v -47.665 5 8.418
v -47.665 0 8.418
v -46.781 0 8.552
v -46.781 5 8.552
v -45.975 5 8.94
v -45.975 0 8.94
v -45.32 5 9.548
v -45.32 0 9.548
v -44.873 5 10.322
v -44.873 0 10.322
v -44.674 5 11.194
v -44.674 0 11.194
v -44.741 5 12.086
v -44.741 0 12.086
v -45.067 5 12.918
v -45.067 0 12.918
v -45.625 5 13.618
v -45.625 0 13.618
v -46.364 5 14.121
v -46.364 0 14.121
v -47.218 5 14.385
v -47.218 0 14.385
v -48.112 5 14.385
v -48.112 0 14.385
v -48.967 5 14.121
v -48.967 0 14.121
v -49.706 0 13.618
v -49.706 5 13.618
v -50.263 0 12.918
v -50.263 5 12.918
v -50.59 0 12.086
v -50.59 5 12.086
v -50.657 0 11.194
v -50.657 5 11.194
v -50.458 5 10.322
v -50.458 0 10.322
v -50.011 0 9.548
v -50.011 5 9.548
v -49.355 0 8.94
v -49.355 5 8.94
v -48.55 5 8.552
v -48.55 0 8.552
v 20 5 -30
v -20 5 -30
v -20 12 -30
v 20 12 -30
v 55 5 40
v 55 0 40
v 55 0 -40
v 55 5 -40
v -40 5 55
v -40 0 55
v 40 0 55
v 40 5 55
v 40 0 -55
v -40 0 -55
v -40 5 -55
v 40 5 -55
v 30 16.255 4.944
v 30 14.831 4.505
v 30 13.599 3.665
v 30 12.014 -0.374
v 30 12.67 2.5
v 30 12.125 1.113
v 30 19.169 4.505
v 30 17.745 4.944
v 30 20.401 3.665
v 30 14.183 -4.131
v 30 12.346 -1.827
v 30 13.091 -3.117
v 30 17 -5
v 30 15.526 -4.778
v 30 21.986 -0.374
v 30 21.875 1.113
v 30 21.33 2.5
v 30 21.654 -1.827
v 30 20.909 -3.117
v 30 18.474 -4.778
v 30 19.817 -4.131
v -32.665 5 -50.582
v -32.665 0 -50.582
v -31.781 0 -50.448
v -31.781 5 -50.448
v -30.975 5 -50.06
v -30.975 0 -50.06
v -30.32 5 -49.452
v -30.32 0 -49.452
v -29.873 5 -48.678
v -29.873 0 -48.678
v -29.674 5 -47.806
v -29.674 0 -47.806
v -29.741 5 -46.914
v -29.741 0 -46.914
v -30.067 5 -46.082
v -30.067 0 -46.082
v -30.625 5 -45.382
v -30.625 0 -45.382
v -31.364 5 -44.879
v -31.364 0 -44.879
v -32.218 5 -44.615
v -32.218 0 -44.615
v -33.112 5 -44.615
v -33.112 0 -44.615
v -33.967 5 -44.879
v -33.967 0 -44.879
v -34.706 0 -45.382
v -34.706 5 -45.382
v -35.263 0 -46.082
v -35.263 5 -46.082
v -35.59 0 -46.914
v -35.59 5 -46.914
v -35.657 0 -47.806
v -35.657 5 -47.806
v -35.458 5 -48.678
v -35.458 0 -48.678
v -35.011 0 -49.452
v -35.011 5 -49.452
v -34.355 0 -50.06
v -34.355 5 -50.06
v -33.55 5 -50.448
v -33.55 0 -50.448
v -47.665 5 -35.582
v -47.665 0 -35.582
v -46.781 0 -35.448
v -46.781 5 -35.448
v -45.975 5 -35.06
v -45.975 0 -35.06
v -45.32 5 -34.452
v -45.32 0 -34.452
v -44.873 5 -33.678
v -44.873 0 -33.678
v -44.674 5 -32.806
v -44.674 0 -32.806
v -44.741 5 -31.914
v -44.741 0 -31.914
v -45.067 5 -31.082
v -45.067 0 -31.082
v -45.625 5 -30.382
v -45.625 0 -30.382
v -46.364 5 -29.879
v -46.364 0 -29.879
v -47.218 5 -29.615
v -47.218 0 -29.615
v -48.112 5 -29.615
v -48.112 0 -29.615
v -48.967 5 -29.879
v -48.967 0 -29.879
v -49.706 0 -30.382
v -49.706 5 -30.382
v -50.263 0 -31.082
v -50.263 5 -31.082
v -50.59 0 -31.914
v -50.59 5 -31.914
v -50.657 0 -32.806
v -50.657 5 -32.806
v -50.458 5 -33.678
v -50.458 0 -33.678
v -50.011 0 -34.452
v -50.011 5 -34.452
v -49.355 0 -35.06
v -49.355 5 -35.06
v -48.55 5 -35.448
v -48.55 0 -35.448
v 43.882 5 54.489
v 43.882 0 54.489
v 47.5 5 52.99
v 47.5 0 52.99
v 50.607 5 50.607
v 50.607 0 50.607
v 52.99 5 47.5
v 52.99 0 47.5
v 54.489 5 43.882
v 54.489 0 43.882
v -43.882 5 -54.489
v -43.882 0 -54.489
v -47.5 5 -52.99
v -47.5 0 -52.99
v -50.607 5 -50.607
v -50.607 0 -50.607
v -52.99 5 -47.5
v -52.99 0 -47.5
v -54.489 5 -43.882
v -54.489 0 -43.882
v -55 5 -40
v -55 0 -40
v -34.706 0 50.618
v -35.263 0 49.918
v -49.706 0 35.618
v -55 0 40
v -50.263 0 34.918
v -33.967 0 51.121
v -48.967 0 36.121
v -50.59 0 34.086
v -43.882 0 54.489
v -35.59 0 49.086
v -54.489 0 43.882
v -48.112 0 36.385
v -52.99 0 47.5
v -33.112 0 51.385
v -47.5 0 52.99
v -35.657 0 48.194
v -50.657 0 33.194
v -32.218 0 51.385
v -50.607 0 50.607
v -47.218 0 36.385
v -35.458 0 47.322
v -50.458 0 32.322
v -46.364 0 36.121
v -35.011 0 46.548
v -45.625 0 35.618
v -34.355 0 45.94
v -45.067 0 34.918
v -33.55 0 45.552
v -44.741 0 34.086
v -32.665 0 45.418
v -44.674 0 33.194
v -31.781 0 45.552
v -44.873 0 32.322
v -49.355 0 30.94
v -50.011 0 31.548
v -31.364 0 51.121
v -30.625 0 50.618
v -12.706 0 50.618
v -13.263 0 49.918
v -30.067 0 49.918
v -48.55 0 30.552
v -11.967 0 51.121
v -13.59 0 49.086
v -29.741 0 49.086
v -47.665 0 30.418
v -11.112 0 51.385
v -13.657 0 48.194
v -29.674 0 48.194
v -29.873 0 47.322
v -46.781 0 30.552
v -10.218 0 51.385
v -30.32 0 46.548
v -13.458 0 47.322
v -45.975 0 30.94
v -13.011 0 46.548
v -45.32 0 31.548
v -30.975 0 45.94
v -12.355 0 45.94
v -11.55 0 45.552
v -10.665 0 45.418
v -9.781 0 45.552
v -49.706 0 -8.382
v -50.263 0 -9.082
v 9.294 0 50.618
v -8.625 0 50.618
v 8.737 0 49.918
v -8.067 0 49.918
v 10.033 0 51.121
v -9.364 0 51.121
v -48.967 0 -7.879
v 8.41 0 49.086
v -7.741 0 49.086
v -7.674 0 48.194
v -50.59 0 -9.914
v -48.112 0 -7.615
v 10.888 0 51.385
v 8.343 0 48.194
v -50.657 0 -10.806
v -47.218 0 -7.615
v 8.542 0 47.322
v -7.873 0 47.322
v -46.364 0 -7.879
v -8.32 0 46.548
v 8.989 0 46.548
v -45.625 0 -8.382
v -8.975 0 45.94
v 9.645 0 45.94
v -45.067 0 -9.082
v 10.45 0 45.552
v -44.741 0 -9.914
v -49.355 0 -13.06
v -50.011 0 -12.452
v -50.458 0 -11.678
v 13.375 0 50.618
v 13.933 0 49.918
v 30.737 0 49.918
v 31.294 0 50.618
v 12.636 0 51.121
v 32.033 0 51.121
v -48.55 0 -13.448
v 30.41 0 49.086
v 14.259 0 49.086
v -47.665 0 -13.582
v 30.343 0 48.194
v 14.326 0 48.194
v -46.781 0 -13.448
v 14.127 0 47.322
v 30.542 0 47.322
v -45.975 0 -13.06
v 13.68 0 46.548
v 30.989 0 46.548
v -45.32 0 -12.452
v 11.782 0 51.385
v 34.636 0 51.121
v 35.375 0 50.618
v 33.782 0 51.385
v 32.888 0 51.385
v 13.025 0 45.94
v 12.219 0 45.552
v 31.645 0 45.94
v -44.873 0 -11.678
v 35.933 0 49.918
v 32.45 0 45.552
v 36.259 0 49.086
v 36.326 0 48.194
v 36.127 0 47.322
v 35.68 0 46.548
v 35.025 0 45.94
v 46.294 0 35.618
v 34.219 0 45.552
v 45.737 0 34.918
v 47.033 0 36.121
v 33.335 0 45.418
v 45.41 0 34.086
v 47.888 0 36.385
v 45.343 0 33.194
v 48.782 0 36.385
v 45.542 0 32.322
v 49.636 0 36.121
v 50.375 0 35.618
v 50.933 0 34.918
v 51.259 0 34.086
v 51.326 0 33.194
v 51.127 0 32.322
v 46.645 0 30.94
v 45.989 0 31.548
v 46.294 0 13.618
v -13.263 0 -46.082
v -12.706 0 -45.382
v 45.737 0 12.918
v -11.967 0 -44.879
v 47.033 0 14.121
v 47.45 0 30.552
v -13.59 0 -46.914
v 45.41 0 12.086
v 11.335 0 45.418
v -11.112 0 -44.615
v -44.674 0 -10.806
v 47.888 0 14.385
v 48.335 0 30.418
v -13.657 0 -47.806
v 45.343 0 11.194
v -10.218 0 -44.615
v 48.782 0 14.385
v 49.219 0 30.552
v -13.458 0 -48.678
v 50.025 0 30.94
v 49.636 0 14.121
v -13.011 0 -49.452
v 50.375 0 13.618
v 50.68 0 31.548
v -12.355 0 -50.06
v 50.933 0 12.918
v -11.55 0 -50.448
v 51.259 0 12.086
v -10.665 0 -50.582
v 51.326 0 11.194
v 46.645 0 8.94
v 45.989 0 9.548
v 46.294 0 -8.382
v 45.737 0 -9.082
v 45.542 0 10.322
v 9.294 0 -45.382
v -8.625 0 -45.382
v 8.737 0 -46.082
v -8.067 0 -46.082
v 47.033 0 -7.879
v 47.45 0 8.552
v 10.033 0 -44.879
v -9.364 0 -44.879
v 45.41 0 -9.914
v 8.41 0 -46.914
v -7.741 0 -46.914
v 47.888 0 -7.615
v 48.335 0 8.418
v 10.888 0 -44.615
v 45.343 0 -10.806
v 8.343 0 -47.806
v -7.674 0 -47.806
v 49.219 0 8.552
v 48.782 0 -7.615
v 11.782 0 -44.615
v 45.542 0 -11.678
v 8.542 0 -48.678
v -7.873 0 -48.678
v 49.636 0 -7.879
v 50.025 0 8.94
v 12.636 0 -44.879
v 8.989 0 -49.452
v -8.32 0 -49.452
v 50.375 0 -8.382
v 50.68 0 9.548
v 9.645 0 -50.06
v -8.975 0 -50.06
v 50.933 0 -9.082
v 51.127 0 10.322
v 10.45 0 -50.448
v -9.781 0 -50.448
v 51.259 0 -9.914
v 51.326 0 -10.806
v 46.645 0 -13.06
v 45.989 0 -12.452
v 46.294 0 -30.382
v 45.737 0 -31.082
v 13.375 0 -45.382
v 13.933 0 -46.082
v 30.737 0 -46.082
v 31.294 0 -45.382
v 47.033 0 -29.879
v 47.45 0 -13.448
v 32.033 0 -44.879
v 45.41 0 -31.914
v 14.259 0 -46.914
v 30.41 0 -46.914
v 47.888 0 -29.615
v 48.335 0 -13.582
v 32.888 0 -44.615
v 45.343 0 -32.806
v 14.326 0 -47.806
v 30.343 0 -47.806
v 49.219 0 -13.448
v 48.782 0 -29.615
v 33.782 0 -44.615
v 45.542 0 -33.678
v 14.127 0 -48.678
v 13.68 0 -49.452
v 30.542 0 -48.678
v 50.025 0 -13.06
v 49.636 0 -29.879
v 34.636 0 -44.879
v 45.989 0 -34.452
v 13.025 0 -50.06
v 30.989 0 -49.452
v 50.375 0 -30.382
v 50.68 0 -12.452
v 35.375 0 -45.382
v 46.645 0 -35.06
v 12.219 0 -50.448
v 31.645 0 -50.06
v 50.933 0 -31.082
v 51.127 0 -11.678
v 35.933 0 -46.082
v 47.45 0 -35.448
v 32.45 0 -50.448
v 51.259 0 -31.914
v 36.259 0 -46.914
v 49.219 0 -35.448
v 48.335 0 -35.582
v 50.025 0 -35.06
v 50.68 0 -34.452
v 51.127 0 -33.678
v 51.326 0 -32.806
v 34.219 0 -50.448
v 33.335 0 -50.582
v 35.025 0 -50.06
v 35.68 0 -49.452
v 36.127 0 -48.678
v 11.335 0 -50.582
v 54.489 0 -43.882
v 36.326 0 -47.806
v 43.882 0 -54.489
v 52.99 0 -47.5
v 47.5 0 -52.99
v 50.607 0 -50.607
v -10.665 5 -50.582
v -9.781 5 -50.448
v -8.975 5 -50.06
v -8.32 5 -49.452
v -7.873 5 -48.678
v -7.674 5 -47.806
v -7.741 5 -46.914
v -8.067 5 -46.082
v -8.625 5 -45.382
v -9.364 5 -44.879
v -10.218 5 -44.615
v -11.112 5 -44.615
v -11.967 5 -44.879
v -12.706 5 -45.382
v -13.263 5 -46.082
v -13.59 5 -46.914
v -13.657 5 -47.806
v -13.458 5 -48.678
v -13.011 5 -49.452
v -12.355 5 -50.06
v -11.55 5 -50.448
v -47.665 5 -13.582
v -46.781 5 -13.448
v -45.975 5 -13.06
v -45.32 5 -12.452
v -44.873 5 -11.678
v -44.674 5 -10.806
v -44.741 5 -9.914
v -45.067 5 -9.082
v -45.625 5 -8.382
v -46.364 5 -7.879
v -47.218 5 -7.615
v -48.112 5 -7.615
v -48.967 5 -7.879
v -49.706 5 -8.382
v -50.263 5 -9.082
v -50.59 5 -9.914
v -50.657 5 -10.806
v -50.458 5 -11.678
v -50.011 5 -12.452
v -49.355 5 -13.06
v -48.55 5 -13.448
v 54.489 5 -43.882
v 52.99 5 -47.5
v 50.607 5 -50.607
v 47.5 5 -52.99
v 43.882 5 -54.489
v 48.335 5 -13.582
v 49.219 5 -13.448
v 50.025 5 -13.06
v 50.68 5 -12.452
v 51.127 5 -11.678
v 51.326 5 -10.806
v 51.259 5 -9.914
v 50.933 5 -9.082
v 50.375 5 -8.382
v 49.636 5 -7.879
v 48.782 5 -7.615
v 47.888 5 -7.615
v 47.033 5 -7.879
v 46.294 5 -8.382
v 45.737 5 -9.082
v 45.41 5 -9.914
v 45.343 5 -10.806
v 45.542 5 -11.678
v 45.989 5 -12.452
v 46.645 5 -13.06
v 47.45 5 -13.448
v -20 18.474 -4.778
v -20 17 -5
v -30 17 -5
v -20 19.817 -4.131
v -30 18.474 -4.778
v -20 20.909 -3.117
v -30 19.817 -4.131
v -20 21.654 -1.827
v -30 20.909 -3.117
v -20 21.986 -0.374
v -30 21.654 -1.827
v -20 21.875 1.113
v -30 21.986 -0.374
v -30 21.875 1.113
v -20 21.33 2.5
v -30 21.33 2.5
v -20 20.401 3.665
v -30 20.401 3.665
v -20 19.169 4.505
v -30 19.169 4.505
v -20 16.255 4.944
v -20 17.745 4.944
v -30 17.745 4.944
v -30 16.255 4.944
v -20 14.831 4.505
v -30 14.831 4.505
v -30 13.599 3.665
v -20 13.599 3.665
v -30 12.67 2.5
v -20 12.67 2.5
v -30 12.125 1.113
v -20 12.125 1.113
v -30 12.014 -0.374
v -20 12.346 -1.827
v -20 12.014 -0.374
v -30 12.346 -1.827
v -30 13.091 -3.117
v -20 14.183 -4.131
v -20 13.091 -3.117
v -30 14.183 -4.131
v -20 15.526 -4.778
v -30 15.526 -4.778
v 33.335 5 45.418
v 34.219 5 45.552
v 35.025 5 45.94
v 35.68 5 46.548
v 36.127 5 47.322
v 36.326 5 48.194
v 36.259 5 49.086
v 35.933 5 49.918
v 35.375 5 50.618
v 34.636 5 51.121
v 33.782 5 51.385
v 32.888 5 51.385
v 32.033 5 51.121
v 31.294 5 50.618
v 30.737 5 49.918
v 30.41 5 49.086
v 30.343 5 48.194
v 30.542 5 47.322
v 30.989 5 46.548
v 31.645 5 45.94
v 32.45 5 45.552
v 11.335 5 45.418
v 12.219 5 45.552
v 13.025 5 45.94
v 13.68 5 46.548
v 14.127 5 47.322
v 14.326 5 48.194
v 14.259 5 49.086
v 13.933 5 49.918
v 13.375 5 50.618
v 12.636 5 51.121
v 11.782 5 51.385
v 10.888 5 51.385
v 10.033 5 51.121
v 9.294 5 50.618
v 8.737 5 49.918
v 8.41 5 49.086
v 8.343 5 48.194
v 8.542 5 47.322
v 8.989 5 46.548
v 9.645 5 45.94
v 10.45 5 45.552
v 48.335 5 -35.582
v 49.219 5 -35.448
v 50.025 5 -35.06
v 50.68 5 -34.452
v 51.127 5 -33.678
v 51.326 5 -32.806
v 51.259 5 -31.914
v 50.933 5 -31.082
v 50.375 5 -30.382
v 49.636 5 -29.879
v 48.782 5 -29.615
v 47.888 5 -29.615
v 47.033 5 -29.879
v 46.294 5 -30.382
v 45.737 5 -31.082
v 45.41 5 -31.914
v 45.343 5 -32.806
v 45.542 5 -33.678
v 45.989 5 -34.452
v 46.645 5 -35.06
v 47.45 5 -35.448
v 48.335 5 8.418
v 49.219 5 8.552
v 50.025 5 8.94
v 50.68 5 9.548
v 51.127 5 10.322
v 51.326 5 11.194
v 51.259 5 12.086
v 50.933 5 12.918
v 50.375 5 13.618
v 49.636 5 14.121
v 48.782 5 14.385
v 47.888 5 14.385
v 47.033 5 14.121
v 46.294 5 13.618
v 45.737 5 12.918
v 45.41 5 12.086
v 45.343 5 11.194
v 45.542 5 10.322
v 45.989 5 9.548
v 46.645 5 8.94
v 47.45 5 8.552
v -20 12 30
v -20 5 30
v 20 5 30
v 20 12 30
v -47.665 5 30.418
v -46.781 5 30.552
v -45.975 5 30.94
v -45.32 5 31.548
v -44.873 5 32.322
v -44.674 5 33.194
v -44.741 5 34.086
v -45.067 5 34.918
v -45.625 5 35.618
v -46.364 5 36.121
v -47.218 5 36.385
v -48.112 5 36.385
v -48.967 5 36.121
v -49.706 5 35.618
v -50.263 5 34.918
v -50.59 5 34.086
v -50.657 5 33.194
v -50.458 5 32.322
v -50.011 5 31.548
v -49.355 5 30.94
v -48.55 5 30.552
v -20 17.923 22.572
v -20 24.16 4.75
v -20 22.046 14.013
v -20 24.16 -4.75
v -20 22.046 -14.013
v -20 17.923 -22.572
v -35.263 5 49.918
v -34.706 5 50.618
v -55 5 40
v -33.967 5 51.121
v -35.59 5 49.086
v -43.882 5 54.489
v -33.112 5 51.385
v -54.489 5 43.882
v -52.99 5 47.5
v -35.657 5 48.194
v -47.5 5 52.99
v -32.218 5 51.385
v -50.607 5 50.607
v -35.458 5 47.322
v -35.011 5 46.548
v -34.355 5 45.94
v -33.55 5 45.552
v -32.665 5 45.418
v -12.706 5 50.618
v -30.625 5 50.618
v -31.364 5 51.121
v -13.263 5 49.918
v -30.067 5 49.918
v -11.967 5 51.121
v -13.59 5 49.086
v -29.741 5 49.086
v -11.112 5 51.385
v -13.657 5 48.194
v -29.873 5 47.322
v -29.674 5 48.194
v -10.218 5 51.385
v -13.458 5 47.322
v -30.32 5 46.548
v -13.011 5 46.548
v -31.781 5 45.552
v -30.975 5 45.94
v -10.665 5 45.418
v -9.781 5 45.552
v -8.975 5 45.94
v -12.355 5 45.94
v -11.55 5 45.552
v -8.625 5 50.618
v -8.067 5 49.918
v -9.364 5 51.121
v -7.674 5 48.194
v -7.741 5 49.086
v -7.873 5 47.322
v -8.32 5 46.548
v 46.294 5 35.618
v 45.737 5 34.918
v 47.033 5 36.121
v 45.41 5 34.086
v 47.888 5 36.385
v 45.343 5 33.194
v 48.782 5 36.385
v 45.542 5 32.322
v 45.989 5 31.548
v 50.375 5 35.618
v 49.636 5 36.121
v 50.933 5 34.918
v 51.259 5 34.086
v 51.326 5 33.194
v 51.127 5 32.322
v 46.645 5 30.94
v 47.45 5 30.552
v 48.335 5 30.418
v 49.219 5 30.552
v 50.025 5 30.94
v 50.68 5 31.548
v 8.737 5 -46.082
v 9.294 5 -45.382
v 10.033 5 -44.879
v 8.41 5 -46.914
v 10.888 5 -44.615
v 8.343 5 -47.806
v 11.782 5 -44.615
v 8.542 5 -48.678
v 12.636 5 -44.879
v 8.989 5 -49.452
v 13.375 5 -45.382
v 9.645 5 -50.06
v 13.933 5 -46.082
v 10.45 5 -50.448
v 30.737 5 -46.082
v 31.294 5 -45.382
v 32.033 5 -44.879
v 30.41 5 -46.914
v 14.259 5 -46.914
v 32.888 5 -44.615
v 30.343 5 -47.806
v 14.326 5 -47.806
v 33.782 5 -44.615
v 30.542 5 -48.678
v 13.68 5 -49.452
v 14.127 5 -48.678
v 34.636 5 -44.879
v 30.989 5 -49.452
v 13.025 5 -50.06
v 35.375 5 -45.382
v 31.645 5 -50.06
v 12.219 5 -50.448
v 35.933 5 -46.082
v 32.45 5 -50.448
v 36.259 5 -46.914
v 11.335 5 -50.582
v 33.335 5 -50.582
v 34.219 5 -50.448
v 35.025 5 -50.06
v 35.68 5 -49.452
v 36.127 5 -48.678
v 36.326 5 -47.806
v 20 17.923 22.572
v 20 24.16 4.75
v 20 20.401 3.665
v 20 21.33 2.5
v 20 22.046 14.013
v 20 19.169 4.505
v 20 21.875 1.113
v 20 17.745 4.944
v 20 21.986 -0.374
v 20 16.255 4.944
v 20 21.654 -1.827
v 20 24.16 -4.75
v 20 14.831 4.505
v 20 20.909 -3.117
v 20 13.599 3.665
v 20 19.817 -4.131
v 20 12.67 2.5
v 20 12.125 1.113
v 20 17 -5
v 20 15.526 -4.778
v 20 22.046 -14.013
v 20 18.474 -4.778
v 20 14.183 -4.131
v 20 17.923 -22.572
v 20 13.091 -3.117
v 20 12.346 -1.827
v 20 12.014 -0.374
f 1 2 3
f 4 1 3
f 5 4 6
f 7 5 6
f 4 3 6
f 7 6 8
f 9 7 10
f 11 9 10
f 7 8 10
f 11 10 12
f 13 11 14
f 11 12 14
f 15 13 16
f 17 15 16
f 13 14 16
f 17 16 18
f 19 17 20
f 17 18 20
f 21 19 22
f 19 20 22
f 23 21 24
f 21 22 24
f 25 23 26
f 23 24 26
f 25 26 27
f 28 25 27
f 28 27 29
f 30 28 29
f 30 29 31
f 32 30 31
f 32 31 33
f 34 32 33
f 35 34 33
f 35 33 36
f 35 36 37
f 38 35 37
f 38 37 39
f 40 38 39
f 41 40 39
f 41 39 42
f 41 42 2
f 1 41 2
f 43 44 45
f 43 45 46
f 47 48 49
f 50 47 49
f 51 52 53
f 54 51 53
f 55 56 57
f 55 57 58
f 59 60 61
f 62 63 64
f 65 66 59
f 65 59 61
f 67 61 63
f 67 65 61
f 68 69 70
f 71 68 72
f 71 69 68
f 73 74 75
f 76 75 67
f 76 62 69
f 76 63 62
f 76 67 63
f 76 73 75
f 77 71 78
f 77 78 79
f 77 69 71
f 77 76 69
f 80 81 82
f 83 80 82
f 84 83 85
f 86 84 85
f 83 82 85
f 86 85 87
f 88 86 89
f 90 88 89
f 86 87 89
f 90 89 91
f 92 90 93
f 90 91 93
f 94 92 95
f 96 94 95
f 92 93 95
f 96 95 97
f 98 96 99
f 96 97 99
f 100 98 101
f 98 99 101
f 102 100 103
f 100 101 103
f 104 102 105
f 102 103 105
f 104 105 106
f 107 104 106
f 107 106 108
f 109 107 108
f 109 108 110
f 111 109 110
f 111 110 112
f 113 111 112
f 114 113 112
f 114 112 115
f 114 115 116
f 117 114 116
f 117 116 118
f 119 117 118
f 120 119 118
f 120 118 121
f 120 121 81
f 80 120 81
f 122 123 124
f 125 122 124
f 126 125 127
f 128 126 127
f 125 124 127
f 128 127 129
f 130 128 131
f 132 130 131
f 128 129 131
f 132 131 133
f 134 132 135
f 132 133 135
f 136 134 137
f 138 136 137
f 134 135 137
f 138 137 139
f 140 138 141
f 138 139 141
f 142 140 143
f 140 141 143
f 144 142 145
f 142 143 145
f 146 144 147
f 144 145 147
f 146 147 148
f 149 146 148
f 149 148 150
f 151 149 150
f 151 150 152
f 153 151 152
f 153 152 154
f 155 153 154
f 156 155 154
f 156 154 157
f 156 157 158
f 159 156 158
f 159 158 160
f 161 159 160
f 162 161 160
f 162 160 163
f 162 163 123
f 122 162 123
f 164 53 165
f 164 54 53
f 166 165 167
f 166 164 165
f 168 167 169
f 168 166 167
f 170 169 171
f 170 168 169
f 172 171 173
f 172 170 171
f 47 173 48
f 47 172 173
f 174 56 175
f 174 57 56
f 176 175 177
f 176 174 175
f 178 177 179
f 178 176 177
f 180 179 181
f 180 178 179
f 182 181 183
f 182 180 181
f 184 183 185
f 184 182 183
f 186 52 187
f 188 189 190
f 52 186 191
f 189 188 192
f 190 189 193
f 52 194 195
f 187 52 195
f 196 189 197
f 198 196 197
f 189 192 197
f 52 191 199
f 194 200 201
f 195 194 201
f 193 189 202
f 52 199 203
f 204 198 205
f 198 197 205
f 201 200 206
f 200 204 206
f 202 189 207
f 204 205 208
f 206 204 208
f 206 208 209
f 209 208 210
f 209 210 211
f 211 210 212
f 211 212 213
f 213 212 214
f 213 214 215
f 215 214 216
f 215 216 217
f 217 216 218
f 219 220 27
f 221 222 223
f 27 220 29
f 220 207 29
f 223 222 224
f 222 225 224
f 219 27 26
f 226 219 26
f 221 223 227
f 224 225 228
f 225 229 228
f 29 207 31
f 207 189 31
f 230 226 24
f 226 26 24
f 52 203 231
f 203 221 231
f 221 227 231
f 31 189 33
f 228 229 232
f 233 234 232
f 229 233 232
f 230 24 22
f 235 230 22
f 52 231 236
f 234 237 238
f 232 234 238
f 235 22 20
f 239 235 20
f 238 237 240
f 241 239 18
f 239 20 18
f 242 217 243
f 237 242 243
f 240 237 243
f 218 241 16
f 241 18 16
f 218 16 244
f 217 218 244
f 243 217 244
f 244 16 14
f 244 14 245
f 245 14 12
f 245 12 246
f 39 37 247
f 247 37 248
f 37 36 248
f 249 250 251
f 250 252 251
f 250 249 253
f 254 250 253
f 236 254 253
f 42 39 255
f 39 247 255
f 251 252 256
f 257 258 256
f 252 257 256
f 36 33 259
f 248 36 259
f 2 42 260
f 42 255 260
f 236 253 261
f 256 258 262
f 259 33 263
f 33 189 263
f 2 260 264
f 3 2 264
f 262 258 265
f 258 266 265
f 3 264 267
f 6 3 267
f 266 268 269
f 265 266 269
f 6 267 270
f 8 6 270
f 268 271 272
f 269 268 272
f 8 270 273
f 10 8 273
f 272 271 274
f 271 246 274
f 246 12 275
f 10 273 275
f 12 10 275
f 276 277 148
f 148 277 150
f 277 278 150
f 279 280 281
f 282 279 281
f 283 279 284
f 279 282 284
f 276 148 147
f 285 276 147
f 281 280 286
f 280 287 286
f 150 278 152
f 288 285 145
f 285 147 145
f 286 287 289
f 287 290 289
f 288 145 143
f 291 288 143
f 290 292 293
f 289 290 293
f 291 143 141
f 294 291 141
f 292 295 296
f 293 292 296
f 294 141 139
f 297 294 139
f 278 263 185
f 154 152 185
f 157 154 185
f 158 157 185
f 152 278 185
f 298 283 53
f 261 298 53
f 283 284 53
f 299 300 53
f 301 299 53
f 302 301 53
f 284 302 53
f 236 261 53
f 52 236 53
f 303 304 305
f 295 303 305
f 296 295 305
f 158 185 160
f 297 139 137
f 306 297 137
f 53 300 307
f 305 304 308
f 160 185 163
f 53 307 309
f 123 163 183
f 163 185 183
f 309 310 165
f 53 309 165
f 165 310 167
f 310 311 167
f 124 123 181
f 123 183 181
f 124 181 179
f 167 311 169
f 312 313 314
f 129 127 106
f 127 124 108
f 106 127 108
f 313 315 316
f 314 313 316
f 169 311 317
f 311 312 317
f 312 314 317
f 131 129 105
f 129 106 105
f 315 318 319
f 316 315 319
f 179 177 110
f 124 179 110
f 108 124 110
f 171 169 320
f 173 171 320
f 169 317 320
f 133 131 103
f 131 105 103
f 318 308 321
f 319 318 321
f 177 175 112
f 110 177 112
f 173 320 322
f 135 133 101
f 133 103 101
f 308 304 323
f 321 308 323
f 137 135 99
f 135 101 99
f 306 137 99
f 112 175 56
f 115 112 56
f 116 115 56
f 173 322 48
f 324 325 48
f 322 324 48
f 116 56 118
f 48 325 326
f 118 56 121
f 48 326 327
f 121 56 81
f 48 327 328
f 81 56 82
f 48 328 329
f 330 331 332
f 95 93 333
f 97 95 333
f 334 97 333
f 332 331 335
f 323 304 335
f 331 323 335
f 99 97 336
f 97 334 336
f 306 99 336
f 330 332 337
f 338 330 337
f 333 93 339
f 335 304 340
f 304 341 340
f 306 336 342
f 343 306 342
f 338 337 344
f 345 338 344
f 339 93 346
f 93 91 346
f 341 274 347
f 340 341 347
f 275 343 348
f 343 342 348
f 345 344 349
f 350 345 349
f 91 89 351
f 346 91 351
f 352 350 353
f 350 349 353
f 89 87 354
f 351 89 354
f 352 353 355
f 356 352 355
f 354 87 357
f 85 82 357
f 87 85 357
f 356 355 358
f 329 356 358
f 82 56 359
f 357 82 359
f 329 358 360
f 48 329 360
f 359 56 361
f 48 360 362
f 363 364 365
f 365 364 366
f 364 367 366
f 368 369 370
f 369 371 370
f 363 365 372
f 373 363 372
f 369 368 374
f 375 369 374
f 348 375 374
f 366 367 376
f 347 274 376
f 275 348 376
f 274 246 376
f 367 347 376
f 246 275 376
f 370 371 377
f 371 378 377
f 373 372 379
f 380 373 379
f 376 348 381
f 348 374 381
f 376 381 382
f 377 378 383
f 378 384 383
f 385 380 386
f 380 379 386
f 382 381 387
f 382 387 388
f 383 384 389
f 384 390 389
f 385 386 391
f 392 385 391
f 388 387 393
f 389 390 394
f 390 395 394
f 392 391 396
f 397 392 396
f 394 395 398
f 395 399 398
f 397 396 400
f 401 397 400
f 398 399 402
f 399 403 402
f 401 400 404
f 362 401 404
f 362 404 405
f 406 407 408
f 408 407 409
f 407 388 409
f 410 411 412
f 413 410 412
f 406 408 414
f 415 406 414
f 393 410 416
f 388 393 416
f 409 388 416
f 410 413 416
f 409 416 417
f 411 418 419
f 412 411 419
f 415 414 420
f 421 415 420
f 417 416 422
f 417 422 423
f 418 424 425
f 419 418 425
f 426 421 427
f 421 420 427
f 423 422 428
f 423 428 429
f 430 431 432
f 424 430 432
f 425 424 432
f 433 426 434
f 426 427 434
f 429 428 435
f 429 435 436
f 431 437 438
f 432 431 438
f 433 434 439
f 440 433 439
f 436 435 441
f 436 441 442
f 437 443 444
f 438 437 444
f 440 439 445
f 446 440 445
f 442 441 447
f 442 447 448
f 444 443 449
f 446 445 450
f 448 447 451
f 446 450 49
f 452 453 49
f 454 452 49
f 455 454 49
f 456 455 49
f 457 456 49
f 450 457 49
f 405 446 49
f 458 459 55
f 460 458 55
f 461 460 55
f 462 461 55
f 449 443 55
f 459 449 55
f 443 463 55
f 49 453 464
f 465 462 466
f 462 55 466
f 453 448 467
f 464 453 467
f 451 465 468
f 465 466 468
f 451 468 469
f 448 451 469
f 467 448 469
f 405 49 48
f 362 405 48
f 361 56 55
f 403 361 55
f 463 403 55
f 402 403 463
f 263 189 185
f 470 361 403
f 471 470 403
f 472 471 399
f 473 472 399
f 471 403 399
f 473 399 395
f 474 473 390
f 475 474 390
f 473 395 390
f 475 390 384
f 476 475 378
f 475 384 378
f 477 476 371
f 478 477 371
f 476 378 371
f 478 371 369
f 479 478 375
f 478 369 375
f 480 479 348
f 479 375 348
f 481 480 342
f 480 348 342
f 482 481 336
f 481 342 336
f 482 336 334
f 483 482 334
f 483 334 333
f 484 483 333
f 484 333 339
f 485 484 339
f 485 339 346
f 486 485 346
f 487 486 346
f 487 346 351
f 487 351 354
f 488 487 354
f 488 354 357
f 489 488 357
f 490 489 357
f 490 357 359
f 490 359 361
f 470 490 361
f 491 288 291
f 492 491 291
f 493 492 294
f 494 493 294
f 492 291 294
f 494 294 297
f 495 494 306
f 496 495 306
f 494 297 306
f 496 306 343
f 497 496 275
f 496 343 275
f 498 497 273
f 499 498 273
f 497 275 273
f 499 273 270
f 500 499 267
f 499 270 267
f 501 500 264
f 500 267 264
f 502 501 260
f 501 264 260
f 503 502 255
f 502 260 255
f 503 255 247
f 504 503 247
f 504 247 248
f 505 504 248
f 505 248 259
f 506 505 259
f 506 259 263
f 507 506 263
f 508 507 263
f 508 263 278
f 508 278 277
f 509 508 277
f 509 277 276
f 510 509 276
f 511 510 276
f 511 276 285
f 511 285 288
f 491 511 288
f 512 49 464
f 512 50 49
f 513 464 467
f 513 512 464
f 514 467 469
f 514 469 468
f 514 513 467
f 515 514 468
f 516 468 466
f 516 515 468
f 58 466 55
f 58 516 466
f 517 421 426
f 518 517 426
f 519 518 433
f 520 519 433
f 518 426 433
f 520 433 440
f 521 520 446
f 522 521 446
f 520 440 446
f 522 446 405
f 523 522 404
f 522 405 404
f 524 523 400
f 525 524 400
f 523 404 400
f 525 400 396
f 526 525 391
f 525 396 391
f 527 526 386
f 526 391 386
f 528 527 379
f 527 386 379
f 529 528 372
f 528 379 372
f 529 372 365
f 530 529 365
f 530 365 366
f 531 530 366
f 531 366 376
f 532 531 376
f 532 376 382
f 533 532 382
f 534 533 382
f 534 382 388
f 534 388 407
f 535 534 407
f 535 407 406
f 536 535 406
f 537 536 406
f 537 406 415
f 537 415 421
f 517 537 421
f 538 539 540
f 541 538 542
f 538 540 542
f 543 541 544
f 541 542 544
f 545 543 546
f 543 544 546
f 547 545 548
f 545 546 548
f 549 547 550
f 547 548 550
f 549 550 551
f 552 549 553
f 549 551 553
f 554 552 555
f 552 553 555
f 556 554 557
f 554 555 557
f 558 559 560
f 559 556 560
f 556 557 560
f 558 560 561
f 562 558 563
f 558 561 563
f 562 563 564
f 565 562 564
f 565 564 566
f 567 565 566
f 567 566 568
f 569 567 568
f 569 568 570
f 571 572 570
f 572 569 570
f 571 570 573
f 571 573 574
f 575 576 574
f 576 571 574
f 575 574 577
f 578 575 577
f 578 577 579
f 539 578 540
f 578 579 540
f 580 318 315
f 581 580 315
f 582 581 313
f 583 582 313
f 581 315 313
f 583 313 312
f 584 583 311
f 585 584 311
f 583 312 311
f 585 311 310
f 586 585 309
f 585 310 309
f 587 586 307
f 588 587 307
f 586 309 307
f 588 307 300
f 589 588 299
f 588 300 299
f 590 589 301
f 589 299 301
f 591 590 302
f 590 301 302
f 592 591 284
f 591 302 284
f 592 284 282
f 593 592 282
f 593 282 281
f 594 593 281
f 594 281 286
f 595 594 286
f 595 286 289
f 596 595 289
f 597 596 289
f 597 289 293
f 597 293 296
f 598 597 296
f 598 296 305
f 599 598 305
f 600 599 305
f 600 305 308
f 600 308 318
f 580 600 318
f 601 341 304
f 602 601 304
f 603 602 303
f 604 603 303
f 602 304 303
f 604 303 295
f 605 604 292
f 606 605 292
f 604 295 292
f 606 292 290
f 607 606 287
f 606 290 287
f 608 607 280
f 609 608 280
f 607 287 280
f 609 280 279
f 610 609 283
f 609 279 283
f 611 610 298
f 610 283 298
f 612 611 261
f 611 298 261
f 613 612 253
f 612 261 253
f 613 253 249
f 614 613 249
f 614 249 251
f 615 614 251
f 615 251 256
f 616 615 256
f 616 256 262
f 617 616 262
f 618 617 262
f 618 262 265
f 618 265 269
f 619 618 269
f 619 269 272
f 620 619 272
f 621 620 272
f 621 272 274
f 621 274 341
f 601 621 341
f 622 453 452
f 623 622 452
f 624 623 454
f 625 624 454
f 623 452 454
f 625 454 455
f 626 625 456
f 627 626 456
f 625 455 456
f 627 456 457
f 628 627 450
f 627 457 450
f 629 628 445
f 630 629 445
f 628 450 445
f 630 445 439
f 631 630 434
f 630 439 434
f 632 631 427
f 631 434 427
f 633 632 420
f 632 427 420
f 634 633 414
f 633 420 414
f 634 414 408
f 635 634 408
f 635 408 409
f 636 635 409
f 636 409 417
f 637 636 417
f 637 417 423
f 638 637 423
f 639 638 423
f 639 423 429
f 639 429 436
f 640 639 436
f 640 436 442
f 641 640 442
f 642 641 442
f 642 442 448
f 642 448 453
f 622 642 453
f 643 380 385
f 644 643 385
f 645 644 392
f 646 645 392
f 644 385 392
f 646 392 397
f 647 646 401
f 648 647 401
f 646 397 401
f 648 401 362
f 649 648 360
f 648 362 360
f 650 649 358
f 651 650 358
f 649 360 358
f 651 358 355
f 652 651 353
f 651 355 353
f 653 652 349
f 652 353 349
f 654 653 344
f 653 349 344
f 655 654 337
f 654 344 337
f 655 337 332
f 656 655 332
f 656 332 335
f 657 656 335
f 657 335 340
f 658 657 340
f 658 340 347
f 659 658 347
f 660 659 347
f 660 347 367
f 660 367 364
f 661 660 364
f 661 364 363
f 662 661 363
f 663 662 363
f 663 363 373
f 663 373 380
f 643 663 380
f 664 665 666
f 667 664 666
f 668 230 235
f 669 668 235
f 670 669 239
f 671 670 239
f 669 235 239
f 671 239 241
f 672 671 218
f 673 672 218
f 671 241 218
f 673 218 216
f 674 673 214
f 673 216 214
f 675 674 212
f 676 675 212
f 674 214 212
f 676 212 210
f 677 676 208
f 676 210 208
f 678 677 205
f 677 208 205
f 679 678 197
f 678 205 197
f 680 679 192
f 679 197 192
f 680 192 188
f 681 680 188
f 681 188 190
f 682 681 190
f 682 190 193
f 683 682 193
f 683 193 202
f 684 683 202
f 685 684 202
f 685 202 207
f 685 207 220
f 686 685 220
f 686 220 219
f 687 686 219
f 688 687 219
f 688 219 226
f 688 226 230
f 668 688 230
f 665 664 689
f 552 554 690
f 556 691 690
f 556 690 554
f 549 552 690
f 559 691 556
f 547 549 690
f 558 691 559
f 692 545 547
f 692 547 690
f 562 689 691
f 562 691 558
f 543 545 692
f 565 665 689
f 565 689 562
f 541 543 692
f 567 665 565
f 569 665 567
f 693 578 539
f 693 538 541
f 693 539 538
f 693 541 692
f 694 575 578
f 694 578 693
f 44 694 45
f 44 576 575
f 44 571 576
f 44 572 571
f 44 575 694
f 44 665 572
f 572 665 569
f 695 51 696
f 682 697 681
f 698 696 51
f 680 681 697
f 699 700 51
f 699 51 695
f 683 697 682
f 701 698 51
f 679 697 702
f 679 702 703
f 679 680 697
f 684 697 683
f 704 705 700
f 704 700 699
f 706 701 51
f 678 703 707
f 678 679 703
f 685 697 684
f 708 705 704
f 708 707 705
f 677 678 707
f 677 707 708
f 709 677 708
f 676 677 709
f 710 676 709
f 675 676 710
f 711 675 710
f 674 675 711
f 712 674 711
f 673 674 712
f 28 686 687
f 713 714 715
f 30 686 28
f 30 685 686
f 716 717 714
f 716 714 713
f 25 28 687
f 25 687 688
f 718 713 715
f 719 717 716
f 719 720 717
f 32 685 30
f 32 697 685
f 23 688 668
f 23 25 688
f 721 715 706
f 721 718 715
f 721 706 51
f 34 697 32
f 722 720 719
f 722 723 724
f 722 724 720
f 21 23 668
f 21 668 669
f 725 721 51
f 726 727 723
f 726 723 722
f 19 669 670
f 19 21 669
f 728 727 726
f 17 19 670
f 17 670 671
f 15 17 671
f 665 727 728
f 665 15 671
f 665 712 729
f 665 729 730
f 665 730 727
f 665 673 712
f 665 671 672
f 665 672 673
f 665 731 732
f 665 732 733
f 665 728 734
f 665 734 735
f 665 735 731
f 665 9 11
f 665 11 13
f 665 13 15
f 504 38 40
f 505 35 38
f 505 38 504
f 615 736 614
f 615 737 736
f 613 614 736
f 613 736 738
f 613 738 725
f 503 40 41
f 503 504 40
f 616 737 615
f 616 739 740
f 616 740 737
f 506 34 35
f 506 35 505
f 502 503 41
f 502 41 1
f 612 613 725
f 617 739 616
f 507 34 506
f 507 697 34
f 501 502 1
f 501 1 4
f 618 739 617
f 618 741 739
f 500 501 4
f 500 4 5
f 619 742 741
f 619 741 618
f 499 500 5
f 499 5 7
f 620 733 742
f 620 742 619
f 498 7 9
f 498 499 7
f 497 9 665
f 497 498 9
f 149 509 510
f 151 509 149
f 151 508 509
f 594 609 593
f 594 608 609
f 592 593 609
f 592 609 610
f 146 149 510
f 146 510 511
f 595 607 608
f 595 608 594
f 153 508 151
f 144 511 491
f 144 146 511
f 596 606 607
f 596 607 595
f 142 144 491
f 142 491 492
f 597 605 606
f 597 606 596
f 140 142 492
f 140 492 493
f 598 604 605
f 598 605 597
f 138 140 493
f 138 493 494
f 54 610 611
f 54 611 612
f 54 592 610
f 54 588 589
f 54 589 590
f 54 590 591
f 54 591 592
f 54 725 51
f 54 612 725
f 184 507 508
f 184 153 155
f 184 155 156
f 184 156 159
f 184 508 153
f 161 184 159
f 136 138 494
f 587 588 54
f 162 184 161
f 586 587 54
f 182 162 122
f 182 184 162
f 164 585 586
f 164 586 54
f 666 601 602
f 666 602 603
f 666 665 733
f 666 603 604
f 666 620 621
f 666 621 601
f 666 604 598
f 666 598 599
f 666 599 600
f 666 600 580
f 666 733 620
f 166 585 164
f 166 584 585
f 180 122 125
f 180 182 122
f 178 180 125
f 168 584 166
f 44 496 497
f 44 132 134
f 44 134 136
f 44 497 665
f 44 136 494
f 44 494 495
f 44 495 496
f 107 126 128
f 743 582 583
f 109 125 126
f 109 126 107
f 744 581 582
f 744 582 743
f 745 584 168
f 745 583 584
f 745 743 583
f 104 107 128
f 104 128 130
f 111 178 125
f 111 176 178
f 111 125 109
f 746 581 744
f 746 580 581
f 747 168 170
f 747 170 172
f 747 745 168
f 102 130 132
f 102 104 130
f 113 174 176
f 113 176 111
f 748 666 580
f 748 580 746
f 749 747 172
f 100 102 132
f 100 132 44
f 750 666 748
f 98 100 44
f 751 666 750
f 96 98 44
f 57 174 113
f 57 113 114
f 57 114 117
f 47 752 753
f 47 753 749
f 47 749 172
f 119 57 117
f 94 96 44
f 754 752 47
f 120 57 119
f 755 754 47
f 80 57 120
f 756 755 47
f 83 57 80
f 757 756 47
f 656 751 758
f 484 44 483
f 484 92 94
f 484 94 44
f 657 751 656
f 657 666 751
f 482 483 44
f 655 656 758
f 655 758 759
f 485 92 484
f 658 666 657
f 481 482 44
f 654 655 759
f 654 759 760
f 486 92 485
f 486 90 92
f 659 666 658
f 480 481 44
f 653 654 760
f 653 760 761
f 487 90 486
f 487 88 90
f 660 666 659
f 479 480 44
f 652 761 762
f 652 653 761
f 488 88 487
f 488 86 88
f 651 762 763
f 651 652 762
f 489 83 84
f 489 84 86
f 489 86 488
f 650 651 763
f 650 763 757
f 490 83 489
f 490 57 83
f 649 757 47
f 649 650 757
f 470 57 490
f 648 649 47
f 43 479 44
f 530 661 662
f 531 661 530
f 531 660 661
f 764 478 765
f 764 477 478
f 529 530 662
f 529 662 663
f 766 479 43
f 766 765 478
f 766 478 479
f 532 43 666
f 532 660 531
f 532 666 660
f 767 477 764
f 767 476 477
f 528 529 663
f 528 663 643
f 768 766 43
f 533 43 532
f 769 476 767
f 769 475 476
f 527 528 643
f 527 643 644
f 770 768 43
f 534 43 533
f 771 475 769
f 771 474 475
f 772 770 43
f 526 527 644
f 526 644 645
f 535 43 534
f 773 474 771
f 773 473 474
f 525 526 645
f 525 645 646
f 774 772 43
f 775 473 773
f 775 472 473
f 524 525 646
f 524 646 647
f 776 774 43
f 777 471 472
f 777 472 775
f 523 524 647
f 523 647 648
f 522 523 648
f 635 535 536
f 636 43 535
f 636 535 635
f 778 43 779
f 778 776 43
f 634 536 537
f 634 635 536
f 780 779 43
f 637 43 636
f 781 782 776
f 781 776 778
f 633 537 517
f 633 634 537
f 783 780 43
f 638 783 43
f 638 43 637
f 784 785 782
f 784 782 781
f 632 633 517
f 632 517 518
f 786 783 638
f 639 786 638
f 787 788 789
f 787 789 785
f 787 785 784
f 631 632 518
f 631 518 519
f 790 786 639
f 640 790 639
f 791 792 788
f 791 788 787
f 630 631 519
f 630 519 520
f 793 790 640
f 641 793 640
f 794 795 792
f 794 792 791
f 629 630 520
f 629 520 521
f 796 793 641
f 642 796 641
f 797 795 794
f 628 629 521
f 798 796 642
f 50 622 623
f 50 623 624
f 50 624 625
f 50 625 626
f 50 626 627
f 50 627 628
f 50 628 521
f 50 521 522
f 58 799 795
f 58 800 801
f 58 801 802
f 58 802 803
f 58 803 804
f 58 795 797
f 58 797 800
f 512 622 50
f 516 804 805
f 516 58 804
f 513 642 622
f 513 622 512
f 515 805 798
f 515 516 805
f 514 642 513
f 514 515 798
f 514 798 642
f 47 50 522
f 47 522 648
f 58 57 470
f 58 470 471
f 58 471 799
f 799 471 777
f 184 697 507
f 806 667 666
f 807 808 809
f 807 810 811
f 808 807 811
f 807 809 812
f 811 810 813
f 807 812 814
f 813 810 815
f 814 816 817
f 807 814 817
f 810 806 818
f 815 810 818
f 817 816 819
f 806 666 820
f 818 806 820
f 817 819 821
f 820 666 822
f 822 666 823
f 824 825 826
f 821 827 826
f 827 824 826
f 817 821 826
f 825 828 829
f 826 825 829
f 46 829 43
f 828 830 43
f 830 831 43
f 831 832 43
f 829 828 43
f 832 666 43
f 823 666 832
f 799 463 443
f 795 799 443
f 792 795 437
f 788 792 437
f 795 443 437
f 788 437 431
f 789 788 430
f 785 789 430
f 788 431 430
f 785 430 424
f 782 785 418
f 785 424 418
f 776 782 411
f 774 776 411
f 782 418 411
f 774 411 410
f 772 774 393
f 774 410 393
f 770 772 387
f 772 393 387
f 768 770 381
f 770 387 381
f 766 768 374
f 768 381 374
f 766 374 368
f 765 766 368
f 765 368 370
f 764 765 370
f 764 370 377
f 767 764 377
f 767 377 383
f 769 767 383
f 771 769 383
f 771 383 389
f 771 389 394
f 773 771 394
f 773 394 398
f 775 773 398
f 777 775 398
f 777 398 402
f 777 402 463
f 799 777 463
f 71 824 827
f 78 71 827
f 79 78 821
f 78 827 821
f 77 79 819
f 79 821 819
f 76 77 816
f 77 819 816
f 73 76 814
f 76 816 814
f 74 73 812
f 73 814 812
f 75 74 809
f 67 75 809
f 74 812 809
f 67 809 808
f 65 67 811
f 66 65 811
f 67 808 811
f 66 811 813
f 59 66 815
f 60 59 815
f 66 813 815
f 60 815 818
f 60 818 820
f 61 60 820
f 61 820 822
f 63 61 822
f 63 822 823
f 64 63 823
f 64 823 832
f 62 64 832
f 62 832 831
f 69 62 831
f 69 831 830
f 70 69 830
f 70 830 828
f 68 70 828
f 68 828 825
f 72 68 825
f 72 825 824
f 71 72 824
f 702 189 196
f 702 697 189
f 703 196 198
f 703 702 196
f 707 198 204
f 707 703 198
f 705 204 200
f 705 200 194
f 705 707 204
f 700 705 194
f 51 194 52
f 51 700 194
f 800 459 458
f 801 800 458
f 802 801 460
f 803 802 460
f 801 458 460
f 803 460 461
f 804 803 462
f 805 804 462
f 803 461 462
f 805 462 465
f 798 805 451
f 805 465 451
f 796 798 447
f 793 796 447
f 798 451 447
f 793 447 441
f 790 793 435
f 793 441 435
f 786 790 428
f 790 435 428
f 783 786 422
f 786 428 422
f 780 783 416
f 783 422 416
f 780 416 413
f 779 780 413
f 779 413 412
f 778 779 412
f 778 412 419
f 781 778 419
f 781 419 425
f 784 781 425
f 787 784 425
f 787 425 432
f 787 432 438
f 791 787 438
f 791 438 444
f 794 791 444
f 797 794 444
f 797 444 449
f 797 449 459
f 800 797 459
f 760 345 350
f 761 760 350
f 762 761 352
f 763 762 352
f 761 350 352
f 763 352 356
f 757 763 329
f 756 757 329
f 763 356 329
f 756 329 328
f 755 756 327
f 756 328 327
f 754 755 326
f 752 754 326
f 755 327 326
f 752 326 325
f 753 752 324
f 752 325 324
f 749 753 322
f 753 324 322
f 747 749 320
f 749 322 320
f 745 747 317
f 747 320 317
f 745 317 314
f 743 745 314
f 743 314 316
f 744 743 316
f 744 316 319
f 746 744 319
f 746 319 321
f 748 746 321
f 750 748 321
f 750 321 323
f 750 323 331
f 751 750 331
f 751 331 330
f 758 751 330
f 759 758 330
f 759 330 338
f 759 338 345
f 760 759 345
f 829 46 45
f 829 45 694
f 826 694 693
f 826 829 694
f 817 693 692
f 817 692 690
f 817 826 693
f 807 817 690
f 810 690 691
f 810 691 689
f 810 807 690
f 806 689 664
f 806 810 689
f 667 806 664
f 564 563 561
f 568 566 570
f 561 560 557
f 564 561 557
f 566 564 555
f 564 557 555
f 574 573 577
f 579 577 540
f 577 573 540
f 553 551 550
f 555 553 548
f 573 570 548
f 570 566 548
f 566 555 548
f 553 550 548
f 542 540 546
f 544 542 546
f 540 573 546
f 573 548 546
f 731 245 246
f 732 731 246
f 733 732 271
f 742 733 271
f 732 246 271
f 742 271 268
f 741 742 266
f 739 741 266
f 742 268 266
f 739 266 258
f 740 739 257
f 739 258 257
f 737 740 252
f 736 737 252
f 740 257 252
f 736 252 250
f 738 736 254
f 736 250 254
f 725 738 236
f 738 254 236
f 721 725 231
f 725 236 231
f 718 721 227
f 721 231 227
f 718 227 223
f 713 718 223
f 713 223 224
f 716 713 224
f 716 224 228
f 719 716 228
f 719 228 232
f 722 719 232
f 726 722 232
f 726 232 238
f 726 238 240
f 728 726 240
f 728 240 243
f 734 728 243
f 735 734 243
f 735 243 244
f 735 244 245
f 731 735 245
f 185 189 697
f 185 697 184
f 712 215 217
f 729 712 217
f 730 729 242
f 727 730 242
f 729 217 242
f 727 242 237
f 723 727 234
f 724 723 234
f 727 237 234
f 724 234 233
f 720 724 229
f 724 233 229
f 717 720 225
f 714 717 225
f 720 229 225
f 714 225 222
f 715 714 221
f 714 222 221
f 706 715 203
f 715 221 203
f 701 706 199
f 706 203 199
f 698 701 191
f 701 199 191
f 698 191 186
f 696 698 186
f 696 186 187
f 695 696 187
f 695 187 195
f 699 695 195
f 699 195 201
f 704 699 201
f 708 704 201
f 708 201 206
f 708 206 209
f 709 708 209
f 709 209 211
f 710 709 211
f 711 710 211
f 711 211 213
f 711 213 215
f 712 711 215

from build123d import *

# Parameters (mm, degrees)
SKETCH1_W                = 110
SKETCH1_H                = 110
BOSS_EXTRUDE1_DEPTH      = 5
FILLET2_R                = 15
FILLET3_R                = 15
FILLET4_R                = 15
FILLET5_R                = 15
SKETCH2_W                = 40
SKETCH2_H                = 60
BOSS_EXTRUDE2_DEPTH      = 24
BOSS_EXTRUDE3_DEPTH      = 10
BOSS_EXTRUDE3_DEPTH_BACK = 50
SKETCH4_R                = 5
FILLET6_R                = 10
FILLET7_R                = 10
SKETCH5_R                = 3
CUT_EXTRUDE1_DEPTH       = 10
CUT_EXTRUDE2_DEPTH       = 60


with BuildPart() as part:
    # Sketch1 → Boss-Extrude1 (new body)
    with BuildSketch(Plane(origin=(0, 0, 0), x_dir=(1, 0, 0), z_dir=(0, 1, 0))):
        Rectangle(SKETCH1_W, SKETCH1_H)
    extrude(amount=BOSS_EXTRUDE1_DEPTH)

    # Fillet2
    fillet2_edges = [part.edges().sort_by_distance(p)[0] for p in [
        (55, 2.5, -55),
    ]]
    fillet(fillet2_edges, radius=FILLET2_R)

    # Fillet3
    fillet3_edges = [part.edges().sort_by_distance(p)[0] for p in [
        (-55, 2.5, -55),
    ]]
    fillet(fillet3_edges, radius=FILLET3_R)

    # Fillet4
    fillet4_edges = [part.edges().sort_by_distance(p)[0] for p in [
        (-55, 2.5, 55),
    ]]
    fillet(fillet4_edges, radius=FILLET4_R)

    # Fillet5
    fillet5_edges = [part.edges().sort_by_distance(p)[0] for p in [
        (55, 2.5, 55),
    ]]
    fillet(fillet5_edges, radius=FILLET5_R)

    # Sketch2 → Boss-Extrude2 (add)
    with BuildSketch(Plane(origin=(0, 5, 0), x_dir=(1, 0, 0), z_dir=(0, 1, 0))):
        Rectangle(SKETCH2_W, SKETCH2_H)
    extrude(amount=BOSS_EXTRUDE2_DEPTH)

    # Sketch4 → Boss-Extrude3 (add, two sides: drawn at the far end of the back side and taken through both)
    with BuildSketch(Plane(origin=(20, 0, 0), x_dir=(0, 0, -1), z_dir=(1, 0, 0)).offset(-BOSS_EXTRUDE3_DEPTH_BACK)):
        with Locations((0, 17)):
            Circle(SKETCH4_R)
    extrude(amount=BOSS_EXTRUDE3_DEPTH + BOSS_EXTRUDE3_DEPTH_BACK)

    # Fillet6
    fillet6_edges = [part.edges().sort_by_distance(p)[0] for p in [
        (0, 29, 30),
    ]]
    fillet(fillet6_edges, radius=FILLET6_R)

    # Fillet7
    fillet7_edges = [part.edges().sort_by_distance(p)[0] for p in [
        (0, 29, -30),
    ]]
    fillet(fillet7_edges, radius=FILLET7_R)

    # Sketch5 → Cut-Extrude1 (cut)
    with BuildSketch(Plane.XZ):
        with Locations(Location((48.334696306, -10.581629618, 0), (0, 0, 270))):
            Circle(SKETCH5_R)
        with Locations(Location((48.334696306, 33.418370382, 0), (0, 0, 270))):
            Circle(SKETCH5_R)
        with Locations(Location((-47.665303694, 11.418370382, 0), (0, 0, 270))):
            Circle(SKETCH5_R)
        with Locations(Location((-47.665303694, -10.581629618, 0), (0, 0, 270))):
            Circle(SKETCH5_R)
        with Locations(Location((-47.665303694, -32.581629618, 0), (0, 0, 270))):
            Circle(SKETCH5_R)
        with Locations(Location((-32.665303694, -47.581629618, 0), (0, 0, 270))):
            Circle(SKETCH5_R)
        with Locations(Location((-10.665303694, -47.581629618, 0), (0, 0, 270))):
            Circle(SKETCH5_R)
        with Locations(Location((11.334696306, -47.581629618, 0), (0, 0, 270))):
            Circle(SKETCH5_R)
        with Locations(Location((33.334696306, -47.581629618, 0), (0, 0, 270))):
            Circle(SKETCH5_R)
        with Locations(Location((48.334696306, -32.581629618, 0), (0, 0, 270))):
            Circle(SKETCH5_R)
        with Locations(Location((48.334696306, 11.418370382, 0), (0, 0, 270))):
            Circle(SKETCH5_R)
        with Locations(Location((33.334696306, 48.418370382, 0), (0, 0, 270))):
            Circle(SKETCH5_R)
        with Locations(Location((11.334696306, 48.418370382, 0), (0, 0, 270))):
            Circle(SKETCH5_R)
        with Locations(Location((-10.665303694, 48.418370382, 0), (0, 0, 270))):
            Circle(SKETCH5_R)
        with Locations(Location((-32.665303694, 48.418370382, 0), (0, 0, 270))):
            Circle(SKETCH5_R)
        with Locations(Location((-47.665303694, 33.418370382, 0), (0, 0, 270))):
            Circle(SKETCH5_R)
    extrude(amount=-CUT_EXTRUDE1_DEPTH, mode=Mode.SUBTRACT)

    # Sketch6 → Cut-Extrude2 (cut)
    with BuildSketch(Plane(origin=(20, 0, 0), x_dir=(0, 0, -1), z_dir=(1, 0, 0))):
        with BuildLine():
            Line((30, 19), (30, 12))
            ThreePointArc((30, 12), (0, 24.426406871), (-30, 12))
            Line((-30, 12), (-30, 19))
            ThreePointArc((-30, 19), (-27.071067812, 26.071067812), (-20, 29))
            Line((-20, 29), (20, 29))
            ThreePointArc((20, 29), (27.071067812, 26.071067812), (30, 19))
        make_face()
    extrude(amount=-CUT_EXTRUDE2_DEPTH, mode=Mode.SUBTRACT)


solid = part.part
